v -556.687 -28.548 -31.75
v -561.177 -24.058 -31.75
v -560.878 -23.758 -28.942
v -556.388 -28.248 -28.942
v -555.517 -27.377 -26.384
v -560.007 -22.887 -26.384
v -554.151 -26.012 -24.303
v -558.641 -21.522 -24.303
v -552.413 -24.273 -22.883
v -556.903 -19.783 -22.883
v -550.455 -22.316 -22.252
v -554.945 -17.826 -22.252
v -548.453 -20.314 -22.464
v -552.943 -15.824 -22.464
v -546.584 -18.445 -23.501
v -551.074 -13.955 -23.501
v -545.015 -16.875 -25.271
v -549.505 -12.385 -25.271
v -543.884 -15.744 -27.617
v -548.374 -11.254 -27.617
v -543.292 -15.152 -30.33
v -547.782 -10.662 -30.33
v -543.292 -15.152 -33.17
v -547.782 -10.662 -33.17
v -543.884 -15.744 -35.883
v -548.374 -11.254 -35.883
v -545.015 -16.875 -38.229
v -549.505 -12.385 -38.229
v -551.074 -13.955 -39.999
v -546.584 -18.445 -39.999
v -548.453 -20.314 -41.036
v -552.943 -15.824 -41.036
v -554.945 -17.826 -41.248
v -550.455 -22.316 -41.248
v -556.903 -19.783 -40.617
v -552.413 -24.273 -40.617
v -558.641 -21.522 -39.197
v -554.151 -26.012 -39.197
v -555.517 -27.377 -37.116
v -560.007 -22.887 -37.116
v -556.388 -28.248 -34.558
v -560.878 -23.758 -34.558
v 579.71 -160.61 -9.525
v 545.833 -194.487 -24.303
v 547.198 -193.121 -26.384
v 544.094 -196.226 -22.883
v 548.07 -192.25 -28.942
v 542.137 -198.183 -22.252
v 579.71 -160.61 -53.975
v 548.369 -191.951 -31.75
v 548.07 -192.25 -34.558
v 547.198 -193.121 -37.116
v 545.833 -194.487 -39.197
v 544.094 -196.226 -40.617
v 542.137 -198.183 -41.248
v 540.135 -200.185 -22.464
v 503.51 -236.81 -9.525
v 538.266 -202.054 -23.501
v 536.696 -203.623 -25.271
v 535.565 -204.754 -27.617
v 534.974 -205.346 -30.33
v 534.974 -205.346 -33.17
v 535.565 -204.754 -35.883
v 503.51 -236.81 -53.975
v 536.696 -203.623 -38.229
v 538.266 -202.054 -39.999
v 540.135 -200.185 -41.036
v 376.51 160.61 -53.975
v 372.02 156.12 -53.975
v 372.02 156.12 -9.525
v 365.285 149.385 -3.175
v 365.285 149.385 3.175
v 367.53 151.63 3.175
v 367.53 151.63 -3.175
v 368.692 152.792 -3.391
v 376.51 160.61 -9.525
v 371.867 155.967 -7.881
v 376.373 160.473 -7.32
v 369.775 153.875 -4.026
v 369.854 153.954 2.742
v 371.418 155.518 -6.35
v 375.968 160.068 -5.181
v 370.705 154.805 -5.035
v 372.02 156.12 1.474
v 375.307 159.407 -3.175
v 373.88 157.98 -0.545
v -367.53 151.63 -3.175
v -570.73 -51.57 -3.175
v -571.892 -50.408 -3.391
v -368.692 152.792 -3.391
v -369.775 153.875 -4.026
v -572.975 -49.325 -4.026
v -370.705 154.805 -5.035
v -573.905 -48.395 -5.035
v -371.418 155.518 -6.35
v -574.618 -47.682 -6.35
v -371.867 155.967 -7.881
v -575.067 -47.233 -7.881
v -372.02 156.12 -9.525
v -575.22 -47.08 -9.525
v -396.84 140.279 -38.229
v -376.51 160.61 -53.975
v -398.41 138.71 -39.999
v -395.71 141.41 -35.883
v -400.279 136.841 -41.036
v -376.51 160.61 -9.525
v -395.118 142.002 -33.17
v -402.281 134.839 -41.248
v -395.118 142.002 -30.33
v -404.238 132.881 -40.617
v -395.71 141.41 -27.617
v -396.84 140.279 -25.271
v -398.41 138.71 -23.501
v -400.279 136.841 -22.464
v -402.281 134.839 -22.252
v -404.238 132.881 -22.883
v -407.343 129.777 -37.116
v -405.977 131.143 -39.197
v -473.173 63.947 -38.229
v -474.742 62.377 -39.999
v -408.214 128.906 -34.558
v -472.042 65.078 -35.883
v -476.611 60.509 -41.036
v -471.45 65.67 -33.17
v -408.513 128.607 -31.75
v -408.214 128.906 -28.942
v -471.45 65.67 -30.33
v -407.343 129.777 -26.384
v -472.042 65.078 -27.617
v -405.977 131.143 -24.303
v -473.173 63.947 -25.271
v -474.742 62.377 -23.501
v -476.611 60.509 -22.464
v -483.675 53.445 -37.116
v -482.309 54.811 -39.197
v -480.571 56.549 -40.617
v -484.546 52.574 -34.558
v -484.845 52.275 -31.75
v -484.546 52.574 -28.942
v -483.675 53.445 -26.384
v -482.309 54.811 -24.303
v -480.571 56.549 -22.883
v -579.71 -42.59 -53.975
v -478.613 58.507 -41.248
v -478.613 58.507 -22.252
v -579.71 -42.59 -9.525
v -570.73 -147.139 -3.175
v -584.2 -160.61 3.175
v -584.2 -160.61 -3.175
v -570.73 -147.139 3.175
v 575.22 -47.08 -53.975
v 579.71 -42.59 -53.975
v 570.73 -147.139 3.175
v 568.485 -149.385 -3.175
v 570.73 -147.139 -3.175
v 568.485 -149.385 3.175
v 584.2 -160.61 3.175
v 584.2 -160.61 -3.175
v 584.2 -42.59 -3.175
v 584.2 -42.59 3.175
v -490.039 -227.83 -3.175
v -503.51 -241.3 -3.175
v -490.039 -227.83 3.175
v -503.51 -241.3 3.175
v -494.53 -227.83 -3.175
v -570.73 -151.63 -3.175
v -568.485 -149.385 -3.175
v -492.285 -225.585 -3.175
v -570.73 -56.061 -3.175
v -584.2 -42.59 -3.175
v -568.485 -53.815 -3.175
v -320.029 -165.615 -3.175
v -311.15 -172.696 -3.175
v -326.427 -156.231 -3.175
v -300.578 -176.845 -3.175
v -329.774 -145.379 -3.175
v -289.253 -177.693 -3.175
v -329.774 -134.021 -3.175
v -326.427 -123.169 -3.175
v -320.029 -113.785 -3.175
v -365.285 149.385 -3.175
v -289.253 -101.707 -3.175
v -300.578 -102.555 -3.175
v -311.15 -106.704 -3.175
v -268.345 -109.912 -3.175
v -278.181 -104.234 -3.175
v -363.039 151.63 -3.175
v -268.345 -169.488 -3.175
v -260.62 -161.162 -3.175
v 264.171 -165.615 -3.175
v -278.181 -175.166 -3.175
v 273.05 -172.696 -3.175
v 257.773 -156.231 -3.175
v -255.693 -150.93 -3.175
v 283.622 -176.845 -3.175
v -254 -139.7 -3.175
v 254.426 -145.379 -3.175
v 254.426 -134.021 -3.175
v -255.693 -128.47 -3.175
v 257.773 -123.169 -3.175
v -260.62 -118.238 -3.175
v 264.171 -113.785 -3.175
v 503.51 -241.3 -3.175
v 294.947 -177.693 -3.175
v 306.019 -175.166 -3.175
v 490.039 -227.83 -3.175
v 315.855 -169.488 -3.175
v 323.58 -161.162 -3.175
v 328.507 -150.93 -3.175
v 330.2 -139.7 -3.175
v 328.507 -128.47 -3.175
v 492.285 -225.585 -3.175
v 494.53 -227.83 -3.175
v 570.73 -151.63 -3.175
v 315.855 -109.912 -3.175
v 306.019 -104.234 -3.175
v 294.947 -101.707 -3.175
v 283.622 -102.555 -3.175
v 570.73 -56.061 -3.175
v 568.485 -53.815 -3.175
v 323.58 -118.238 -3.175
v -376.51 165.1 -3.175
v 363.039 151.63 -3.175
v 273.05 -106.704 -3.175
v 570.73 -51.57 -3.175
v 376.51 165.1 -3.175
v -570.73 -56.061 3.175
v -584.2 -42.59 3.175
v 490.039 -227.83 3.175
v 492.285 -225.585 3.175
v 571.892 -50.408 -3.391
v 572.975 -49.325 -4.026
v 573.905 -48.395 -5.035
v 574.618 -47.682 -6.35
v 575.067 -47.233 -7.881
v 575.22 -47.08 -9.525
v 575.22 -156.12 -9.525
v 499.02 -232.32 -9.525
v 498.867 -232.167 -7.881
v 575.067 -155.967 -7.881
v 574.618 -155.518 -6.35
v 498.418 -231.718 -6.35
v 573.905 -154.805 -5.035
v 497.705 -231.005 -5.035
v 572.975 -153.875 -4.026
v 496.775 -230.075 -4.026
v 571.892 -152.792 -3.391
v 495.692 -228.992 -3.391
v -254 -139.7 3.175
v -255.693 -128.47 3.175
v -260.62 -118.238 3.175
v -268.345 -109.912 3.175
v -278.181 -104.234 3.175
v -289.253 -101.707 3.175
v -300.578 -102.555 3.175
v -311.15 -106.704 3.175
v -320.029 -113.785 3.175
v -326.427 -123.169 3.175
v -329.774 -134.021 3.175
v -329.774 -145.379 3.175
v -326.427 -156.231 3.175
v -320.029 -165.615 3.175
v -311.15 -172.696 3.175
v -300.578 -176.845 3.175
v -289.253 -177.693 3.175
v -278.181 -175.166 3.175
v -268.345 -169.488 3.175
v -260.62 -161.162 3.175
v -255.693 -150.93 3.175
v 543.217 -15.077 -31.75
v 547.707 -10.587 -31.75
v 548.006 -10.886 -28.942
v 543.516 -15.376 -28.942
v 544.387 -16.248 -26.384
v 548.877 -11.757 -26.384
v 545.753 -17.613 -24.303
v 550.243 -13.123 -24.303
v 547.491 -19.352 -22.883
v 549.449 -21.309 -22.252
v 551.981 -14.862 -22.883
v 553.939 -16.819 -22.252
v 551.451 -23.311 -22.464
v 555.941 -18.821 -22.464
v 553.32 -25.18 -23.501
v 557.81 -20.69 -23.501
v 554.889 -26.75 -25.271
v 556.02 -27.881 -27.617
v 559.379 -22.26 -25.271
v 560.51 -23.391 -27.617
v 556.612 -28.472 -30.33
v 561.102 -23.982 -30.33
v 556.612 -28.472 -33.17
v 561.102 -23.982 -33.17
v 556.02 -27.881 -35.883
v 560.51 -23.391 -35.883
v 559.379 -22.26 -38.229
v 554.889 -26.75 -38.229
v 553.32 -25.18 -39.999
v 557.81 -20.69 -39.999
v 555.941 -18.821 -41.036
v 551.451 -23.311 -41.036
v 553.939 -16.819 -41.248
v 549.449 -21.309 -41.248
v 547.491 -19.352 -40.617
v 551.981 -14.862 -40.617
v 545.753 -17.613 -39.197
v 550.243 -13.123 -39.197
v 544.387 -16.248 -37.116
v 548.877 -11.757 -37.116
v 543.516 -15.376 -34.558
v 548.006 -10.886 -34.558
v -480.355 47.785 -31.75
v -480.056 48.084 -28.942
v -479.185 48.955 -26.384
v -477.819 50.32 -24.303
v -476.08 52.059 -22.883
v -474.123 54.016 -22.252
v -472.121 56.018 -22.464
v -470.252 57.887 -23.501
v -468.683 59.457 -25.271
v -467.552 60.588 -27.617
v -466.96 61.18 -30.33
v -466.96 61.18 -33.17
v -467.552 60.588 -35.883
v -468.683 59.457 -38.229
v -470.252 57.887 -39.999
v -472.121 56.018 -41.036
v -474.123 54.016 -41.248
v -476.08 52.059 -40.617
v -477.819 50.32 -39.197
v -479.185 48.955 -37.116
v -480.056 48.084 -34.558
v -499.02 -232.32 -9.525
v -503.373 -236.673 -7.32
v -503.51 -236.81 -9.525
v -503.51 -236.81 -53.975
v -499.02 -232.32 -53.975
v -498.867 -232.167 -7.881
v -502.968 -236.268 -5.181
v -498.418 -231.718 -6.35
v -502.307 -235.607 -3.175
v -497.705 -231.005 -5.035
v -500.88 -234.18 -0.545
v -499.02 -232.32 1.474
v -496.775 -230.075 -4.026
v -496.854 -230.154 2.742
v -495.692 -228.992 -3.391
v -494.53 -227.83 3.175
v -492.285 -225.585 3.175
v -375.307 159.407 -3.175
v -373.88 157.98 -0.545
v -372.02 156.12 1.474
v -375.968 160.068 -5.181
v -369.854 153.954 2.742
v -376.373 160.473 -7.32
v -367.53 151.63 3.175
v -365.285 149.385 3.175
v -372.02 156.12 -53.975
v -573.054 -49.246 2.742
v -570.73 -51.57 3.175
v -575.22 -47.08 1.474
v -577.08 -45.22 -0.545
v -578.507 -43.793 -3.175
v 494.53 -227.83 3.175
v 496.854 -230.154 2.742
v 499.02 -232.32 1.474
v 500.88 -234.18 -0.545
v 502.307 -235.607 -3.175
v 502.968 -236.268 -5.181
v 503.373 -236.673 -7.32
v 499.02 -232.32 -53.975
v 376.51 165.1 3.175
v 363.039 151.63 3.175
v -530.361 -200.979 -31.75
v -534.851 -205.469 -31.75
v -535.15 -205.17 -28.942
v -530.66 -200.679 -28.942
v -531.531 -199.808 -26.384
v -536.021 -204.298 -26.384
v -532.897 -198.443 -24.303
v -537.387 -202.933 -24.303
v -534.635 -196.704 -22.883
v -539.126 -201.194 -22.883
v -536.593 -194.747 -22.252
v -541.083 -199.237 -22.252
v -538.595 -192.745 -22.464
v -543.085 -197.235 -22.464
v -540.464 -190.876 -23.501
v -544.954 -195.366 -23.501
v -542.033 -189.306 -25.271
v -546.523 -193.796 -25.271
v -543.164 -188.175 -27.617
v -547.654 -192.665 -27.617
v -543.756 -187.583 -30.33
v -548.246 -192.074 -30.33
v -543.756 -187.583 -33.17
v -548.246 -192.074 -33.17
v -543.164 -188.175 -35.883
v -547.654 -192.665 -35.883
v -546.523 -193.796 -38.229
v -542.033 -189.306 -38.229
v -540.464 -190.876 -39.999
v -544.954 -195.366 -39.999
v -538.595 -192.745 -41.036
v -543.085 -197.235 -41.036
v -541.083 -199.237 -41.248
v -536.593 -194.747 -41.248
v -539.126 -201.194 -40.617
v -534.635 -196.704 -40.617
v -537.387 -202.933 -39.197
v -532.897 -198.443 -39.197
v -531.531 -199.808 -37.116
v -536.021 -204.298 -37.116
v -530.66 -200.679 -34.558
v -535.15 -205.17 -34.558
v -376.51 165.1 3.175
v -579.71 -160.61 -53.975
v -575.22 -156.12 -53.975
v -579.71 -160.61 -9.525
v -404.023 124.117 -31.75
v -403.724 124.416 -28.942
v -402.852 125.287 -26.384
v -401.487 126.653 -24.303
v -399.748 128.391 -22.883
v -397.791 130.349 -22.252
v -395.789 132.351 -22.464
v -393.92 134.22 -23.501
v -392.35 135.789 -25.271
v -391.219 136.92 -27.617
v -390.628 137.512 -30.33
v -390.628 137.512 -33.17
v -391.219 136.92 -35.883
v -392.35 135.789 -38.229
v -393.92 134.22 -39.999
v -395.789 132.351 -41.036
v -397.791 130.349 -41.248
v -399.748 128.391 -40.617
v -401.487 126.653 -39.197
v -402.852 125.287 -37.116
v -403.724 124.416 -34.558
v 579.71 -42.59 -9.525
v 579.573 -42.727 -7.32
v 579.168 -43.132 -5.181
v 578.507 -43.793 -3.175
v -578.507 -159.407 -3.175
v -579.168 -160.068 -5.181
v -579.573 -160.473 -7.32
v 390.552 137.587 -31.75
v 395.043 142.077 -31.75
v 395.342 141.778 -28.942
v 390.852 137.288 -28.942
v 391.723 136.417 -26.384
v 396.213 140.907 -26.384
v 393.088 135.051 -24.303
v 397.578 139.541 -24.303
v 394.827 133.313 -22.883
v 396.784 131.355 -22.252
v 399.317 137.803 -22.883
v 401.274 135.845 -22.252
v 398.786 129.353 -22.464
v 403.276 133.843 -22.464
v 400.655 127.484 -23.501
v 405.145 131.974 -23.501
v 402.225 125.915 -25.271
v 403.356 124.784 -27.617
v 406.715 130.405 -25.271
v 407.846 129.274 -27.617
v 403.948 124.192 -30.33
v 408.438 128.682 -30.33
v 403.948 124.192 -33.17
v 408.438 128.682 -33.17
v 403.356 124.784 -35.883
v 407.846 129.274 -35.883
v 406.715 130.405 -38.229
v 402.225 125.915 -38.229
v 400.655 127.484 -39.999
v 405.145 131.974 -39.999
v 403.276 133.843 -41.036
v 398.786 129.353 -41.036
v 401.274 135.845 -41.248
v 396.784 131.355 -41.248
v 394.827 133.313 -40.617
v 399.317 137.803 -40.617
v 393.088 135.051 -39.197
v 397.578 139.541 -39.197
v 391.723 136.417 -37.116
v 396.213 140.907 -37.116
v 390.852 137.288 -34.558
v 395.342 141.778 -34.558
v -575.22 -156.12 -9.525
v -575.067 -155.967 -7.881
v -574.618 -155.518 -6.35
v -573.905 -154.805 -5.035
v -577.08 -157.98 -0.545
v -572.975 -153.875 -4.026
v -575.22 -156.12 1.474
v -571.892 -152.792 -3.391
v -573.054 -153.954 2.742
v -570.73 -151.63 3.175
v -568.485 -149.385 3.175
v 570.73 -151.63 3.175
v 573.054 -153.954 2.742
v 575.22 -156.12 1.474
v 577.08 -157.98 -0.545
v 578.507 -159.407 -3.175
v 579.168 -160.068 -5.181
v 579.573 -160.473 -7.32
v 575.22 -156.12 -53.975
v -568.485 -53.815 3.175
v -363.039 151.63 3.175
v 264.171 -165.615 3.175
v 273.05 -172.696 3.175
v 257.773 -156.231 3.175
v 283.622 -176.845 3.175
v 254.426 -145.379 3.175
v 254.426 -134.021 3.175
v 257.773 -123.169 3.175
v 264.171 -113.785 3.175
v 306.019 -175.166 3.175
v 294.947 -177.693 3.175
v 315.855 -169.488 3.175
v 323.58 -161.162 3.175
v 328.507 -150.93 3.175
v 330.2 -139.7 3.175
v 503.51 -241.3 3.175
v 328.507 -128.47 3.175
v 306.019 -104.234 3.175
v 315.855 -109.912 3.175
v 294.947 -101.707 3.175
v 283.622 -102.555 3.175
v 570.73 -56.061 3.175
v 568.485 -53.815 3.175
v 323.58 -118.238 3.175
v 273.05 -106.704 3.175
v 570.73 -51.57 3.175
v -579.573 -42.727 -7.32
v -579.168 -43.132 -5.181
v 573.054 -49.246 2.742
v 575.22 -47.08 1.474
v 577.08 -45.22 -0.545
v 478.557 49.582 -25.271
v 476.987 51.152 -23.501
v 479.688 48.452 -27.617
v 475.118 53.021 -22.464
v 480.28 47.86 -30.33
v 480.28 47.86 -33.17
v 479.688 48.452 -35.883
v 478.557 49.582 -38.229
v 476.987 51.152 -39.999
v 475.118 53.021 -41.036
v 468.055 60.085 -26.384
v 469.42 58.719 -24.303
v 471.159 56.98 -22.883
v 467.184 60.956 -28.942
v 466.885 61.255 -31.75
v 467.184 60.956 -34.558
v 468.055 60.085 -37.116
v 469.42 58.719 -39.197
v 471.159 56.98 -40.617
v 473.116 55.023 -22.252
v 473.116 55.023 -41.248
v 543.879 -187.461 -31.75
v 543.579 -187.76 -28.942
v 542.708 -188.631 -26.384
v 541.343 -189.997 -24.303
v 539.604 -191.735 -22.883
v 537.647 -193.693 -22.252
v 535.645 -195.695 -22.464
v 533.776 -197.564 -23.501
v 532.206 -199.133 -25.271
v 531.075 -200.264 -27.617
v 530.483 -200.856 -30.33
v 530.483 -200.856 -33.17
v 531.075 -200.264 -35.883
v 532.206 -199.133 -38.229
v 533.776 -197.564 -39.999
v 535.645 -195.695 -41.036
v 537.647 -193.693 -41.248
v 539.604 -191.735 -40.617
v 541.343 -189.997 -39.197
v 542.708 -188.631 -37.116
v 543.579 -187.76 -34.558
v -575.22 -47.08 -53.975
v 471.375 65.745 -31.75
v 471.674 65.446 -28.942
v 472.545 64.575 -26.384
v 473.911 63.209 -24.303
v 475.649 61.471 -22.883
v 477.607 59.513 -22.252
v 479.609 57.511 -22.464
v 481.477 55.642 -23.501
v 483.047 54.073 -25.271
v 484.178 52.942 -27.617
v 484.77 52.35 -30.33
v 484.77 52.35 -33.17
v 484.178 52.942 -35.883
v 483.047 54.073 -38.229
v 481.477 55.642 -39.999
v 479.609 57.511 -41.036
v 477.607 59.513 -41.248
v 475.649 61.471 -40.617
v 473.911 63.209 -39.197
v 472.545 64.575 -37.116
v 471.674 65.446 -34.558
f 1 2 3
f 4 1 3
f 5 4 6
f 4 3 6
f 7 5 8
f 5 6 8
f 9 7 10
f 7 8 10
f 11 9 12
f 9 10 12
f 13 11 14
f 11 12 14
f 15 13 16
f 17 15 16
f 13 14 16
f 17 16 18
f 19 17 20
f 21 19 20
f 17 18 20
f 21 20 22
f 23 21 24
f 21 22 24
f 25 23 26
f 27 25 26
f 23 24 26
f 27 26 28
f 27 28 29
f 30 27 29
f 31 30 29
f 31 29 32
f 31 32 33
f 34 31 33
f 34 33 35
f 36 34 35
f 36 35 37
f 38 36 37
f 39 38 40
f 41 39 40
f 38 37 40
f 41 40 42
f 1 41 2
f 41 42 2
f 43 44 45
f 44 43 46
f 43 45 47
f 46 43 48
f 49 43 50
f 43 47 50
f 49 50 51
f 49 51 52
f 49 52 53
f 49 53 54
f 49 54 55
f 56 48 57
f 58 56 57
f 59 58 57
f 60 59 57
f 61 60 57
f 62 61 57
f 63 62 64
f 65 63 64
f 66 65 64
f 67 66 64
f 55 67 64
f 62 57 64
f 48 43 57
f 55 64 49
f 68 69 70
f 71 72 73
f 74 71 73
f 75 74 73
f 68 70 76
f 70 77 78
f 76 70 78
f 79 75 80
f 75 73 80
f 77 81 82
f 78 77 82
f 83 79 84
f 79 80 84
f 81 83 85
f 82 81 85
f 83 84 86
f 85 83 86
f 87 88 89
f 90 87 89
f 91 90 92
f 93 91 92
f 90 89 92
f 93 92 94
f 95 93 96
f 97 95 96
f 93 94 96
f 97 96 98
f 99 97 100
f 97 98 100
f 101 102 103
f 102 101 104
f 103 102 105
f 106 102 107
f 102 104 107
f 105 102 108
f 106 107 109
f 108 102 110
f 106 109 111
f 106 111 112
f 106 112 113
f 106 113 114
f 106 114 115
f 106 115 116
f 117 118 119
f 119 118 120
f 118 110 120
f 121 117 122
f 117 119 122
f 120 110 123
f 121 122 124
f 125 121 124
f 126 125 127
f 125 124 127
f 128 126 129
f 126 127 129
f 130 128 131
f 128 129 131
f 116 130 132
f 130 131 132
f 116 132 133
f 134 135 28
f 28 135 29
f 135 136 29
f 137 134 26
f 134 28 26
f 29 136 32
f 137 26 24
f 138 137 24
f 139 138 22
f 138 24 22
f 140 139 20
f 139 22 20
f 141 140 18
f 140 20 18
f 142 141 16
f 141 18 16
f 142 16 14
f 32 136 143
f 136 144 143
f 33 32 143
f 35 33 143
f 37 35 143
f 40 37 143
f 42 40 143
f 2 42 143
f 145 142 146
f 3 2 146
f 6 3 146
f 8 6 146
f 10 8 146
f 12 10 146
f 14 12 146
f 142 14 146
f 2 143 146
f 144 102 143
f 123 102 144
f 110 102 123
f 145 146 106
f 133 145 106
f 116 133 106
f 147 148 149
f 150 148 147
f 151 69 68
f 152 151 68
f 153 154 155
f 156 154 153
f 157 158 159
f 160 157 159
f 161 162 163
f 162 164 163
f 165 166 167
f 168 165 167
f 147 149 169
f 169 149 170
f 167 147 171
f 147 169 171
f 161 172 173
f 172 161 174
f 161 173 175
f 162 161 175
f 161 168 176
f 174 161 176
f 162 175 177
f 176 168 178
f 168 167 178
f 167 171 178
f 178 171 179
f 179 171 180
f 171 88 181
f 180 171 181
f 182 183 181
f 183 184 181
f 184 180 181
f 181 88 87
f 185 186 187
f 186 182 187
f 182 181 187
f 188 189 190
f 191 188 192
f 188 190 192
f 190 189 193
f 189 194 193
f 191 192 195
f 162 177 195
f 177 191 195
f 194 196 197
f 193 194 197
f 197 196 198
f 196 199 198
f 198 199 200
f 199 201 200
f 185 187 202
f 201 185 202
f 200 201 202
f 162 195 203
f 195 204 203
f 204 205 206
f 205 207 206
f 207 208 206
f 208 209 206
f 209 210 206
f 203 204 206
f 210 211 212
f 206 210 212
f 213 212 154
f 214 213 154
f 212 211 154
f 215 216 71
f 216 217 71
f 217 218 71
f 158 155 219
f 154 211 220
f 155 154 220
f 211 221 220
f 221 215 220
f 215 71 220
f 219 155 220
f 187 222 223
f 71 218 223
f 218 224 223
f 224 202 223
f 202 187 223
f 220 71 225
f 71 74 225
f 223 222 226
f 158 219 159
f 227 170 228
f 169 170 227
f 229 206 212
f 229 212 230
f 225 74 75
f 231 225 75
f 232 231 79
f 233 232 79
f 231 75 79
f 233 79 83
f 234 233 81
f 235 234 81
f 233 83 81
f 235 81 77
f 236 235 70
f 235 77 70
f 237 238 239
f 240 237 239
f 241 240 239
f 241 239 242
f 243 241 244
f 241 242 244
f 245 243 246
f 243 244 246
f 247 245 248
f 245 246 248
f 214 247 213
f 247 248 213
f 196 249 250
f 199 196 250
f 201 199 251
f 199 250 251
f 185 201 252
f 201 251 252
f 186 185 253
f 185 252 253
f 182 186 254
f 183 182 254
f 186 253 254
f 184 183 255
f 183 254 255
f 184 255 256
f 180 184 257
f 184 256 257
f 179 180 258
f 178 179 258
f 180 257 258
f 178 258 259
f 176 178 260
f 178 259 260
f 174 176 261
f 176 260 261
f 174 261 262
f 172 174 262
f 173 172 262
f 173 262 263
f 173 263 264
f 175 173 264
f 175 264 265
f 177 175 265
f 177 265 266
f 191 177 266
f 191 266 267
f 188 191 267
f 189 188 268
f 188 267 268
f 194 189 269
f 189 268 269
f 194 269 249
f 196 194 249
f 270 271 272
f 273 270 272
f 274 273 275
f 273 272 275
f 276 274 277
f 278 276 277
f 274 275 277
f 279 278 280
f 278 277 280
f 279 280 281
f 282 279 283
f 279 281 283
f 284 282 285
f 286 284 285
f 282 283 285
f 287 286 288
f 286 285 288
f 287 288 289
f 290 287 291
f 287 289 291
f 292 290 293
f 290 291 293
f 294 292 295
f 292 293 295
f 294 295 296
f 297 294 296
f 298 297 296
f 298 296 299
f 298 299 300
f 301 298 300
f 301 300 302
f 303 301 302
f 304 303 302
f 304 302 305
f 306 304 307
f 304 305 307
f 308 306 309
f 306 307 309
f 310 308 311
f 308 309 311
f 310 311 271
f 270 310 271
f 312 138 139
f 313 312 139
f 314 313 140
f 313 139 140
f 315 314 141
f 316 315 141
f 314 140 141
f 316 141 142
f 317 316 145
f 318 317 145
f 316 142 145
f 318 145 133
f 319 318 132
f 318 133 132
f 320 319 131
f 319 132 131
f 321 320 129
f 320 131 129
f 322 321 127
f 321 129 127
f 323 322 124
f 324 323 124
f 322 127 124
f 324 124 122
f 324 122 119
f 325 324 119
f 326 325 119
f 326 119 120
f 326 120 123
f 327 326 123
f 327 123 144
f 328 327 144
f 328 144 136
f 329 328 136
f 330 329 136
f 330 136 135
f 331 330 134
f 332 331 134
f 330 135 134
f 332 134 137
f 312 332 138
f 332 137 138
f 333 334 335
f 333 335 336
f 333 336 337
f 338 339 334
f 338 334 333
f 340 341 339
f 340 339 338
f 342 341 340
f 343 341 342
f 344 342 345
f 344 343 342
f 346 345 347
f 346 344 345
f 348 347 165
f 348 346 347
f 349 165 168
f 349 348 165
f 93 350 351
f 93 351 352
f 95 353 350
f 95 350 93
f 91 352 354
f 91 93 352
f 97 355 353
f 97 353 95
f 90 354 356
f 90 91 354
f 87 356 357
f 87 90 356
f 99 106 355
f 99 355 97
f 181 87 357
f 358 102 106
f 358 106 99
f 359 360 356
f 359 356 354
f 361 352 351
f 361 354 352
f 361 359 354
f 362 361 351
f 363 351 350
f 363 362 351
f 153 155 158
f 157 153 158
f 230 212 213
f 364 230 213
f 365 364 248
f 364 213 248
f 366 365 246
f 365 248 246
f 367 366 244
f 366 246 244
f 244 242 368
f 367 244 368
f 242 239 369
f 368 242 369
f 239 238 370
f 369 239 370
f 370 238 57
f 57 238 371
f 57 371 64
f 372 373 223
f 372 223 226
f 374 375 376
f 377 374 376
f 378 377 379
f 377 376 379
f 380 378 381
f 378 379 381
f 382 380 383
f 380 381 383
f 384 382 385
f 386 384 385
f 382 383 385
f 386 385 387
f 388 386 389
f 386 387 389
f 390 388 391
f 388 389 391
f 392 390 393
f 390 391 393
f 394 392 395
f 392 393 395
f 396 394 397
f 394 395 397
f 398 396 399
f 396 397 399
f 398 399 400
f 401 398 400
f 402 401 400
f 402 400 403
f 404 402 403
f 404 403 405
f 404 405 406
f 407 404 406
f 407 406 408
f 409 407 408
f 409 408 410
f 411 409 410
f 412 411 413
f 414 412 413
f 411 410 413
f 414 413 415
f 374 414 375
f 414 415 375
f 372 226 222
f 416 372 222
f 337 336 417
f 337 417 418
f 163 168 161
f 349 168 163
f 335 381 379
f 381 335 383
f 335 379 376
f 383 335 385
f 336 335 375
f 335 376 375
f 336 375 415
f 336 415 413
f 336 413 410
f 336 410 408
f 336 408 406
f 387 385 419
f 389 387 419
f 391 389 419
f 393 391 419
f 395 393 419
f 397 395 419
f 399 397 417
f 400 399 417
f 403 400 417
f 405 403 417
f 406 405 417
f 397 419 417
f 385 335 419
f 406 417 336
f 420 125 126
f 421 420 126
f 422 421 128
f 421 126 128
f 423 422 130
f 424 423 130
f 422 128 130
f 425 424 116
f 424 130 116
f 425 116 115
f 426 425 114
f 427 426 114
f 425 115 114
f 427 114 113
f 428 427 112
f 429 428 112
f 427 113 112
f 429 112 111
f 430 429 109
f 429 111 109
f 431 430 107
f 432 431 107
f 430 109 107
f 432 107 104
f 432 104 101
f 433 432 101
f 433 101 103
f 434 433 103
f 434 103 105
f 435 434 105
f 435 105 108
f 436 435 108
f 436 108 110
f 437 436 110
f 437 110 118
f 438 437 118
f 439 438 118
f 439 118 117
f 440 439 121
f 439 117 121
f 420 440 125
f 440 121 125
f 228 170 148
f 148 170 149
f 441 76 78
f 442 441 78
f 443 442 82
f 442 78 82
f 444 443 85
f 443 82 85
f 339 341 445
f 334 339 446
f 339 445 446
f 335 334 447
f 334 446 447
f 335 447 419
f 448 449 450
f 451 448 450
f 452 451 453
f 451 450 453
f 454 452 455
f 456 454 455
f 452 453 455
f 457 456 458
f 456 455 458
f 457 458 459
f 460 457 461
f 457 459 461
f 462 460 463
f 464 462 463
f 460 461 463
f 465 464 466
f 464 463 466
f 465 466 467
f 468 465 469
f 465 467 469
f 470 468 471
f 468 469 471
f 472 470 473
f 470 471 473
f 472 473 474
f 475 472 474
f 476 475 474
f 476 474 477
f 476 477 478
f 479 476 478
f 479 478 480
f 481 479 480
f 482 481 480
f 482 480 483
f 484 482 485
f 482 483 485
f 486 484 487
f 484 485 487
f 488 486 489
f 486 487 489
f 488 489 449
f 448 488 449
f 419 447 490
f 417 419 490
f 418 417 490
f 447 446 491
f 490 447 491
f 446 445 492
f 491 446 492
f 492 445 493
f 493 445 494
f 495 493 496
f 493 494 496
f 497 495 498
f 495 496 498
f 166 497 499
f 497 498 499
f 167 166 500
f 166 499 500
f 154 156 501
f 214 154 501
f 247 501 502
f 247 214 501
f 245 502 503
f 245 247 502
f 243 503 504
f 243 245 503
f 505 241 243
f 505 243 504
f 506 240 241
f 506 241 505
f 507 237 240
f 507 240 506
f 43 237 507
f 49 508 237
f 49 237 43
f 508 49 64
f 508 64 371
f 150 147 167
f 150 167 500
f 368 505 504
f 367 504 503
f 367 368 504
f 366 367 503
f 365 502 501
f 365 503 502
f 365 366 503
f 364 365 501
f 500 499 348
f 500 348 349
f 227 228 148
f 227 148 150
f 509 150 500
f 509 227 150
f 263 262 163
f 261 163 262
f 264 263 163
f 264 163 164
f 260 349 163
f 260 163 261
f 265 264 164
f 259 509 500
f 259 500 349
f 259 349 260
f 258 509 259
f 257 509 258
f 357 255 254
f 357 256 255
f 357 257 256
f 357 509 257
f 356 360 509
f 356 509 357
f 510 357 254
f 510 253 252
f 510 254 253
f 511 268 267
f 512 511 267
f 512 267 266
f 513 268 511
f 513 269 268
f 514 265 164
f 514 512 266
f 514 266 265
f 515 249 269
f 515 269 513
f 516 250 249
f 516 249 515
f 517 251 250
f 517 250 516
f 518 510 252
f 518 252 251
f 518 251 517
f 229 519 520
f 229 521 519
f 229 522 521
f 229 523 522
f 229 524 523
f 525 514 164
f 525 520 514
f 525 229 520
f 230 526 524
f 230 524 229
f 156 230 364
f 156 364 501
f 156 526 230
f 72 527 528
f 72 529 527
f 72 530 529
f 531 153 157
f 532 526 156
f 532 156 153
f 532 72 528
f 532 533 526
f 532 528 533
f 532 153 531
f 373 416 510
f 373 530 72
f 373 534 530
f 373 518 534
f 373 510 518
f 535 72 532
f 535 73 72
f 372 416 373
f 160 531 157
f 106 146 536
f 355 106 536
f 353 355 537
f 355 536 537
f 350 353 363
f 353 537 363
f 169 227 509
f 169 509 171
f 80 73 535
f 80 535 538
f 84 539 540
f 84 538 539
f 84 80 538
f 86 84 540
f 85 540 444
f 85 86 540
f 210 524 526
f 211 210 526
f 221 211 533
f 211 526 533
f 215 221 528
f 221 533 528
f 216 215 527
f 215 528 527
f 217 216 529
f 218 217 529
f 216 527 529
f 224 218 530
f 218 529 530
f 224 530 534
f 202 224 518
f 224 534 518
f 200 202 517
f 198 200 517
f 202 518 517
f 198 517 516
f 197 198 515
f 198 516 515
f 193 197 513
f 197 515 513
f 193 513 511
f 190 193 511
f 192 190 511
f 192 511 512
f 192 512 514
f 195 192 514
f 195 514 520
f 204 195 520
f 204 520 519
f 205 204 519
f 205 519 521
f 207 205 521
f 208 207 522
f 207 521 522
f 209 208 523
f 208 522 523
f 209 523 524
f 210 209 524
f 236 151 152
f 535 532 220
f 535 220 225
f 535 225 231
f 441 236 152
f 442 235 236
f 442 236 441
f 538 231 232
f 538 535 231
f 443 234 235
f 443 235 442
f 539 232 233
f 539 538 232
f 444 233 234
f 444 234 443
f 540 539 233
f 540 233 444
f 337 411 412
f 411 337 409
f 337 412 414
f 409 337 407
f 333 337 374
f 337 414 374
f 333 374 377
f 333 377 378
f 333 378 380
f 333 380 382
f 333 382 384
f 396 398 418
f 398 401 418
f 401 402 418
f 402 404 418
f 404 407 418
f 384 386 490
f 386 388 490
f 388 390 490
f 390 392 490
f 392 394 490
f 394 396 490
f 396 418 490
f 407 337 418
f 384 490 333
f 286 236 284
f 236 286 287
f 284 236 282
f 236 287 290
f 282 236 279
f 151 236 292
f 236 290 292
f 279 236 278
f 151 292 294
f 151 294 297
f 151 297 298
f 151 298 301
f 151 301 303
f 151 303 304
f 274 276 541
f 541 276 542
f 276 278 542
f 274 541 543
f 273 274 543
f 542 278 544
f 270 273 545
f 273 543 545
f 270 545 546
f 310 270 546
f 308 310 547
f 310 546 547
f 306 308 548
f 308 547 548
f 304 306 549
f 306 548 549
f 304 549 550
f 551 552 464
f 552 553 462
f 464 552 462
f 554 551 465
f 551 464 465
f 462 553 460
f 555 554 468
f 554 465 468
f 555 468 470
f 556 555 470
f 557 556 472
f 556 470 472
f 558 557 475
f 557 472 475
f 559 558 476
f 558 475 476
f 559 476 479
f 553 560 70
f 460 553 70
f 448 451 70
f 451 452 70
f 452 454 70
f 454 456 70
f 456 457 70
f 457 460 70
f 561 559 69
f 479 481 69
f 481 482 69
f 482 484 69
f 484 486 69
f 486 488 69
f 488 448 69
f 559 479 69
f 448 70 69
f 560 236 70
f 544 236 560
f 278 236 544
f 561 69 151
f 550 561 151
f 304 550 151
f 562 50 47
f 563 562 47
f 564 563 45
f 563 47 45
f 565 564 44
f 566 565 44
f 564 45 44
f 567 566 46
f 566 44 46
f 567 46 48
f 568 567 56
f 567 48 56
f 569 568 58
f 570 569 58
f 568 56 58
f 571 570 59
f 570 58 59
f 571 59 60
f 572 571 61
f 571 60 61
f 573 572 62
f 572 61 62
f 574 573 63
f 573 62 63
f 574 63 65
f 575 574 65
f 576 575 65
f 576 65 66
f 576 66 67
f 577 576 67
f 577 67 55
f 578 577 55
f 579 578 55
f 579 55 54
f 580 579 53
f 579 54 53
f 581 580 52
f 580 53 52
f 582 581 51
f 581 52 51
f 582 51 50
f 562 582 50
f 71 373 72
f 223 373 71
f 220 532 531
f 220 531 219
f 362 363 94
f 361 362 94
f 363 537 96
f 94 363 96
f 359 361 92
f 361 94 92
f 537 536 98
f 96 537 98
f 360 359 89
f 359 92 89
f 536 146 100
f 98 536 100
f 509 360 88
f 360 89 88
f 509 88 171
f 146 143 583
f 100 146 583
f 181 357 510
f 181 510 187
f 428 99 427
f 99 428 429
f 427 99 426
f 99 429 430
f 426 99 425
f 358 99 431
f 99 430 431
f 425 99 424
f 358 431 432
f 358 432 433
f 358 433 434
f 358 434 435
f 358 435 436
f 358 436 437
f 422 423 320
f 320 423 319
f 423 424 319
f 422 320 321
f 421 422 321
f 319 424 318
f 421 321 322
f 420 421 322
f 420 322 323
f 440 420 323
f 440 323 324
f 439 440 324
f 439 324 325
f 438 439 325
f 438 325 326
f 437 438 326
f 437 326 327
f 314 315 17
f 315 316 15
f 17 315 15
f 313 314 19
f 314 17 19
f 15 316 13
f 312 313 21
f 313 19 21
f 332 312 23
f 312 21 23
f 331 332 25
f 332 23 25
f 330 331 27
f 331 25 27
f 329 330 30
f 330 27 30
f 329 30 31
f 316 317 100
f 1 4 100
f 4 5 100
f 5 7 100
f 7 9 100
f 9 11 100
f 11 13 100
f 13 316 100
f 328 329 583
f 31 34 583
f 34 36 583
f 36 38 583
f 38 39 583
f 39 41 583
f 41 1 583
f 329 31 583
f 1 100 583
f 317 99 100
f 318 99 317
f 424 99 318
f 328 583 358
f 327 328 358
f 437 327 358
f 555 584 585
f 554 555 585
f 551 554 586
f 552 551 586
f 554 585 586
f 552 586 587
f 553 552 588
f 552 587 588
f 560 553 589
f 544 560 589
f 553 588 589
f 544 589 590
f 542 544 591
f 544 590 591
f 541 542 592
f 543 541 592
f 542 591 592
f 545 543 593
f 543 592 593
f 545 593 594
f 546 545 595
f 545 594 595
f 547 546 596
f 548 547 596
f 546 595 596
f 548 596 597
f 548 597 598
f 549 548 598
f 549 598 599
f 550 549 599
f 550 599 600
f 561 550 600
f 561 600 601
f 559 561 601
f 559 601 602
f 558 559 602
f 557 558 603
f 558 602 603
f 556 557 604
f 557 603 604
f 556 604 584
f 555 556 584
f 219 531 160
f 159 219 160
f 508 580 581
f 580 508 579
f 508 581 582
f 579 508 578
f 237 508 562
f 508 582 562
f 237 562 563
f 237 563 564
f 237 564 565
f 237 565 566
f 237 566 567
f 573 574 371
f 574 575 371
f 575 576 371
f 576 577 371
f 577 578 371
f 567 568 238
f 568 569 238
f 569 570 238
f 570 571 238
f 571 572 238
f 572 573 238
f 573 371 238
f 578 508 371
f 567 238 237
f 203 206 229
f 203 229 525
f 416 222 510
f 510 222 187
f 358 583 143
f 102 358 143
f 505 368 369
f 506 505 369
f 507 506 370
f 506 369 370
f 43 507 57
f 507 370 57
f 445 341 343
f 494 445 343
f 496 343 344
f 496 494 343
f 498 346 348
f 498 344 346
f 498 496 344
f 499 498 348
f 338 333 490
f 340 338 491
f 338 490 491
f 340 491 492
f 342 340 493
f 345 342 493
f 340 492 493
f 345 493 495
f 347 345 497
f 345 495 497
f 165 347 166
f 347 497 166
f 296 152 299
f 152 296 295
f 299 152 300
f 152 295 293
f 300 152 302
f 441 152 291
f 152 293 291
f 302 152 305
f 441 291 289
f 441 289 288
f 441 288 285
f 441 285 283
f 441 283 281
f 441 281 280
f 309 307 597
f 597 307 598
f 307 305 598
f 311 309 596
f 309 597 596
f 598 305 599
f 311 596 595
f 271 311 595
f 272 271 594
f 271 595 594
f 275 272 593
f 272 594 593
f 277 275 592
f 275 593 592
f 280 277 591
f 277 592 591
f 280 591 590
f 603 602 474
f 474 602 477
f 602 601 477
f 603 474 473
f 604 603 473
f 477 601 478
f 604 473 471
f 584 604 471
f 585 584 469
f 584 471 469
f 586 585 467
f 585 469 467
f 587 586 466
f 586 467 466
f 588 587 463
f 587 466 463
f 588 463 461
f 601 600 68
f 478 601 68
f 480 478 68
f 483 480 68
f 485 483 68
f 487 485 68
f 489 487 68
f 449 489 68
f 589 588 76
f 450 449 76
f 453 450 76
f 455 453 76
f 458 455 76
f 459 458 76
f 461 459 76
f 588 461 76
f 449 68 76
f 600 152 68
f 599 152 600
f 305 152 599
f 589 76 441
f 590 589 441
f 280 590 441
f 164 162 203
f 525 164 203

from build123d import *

# Parameters (mm, degrees)
BASE_FLANGE1_START    = -3.175
BASE_FLANGE1_DEPTH    = 6.35
EDGE_FLANGE1_START    = 152.664354058
EDGE_FLANGE1_DEPTH    = 287.368195874
EDGE_FLANGE1_START_2  = -296.348451995
EDGE_FLANGE1_2_DEPTH  = 107.763073453
EDGE_FLANGE1_START_3  = -826.183563138
EDGE_FLANGE1_3_DEPTH  = 287.368195874
EDGE_FLANGE1_START_4  = -197.565634664
EDGE_FLANGE1_4_DEPTH  = 107.763073453
EDGE_FLANGE1_START_5  = 149.489354058
EDGE_FLANGE1_5_DEPTH  = 293.718195874
EDGE_FLANGE1_START_6  = -299.523451995
EDGE_FLANGE1_6_DEPTH  = 114.113073453
EDGE_FLANGE1_7_DEPTH  = 3.175
EDGE_FLANGE1_START_7  = -188.585378542
EDGE_FLANGE1_8_DEPTH  = 3.175
EDGE_FLANGE1_9_DEPTH  = 3.175
EDGE_FLANGE1_START_8  = 440.032549932
EDGE_FLANGE1_10_DEPTH = 3.175
EDGE_FLANGE1_START_9  = -829.358563138
EDGE_FLANGE1_11_DEPTH = 293.718195874
EDGE_FLANGE1_START_10 = -200.740634664
EDGE_FLANGE1_12_DEPTH = 114.113073453
EDGE_FLANGE1_13_DEPTH = 3.175
EDGE_FLANGE1_START_11 = -538.815367264
EDGE_FLANGE1_14_DEPTH = 3.175
EDGE_FLANGE1_15_DEPTH = 3.175
EDGE_FLANGE1_START_12 = -89.802561211
EDGE_FLANGE1_16_DEPTH = 3.175
SKETCH21_R            = 9.525
CUT_EXTRUDE1_DEPTH    = 6.35
SKETCH22_R            = 9.525
CUT_EXTRUDE2_DEPTH    = 6.35
SKETCH29_R            = 9.525
CUT_EXTRUDE5_DEPTH    = 6.35
SKETCH30_R            = 9.525
CUT_EXTRUDE6_DEPTH    = 6.35
SKETCH31_R            = 38.1
CUT_EXTRUDE7_DEPTH    = 6.35


# Read off the part's stored shape, not the designer's step: Base-Flange1, Edge-Flange1
with BuildPart() as part:
    # Base-Flange1 outline → Base-Flange1 (new body)
    with BuildSketch(Plane.XY.offset(BASE_FLANGE1_START)):
        Polygon((-508, -241.3), (508, -241.3), (584.2, -165.1), (584.2, -38.1), (381, 165.1), (-381, 165.1), (-584.2, -38.1), (-584.2, -165.1), align=None)
    extrude(amount=BASE_FLANGE1_DEPTH)

    # Edge-Flange1 outline → Edge-Flange1 (add)
    with BuildSketch(Plane(origin=(0, 0, 0), x_dir=(0.7071067811865474, 0.7071067811865477, 0), z_dir=(0.7071067811865476, -0.7071067811865476, 0)).offset(EDGE_FLANGE1_START)):
        with BuildLine():
            Line((378.099535834, -3.175), (367.101013206, -3.175))
            ThreePointArc((367.101013206, -3.175), (371.591141267, -5.034871939), (373.451013206, -9.525))
            Line((373.451013206, -9.525), (373.451013206, -53.975))
            Line((373.451013206, -53.975), (379.801013206, -53.975))
            Line((379.801013206, -53.975), (379.801013206, -9.525))
            ThreePointArc((379.801013206, -9.525), (379.3682712, -6.237998127), (378.099535834, -3.175))
        make_face()
    extrude(amount=EDGE_FLANGE1_DEPTH)

    # Edge-Flange1 2 outline → Edge-Flange1 2 (add)
    with BuildSketch(Plane(origin=(0, 0, 0), x_dir=(0.7071067811865474, 0.7071067811865477, 0), z_dir=(0.7071067811865476, -0.7071067811865476, 0)).offset(EDGE_FLANGE1_START_2)):
        with BuildLine():
            ThreePointArc((-517.135111143, -9.525), (-515.275239204, -5.034871939), (-510.785111143, -3.175))
            Line((-510.785111143, -3.175), (-521.783633771, -3.175))
            ThreePointArc((-521.783633771, -3.175), (-523.052369137, -6.237998127), (-523.485111143, -9.525))
            Line((-523.485111143, -9.525), (-523.485111143, -53.975))
            Line((-523.485111143, -53.975), (-517.135111143, -53.975))
            Line((-517.135111143, -53.975), (-517.135111143, -9.525))
        make_face()
    extrude(amount=EDGE_FLANGE1_2_DEPTH)

    # Edge-Flange1 3 outline → Edge-Flange1 3 (add)
    with BuildSketch(Plane(origin=(273.05, 273.05, -3.175), x_dir=(0.7071067811865481, -0.7071067811865469, 0), z_dir=(0.7071067811865469, 0.7071067811865481, 3.4914813388431334e-15)).offset(EDGE_FLANGE1_START_3)):
        with BuildLine():
            Line((-378.099535834, 0), (-367.101013206, 0))
            ThreePointArc((-367.101013206, 0), (-371.591141267, 1.859871939), (-373.451013206, 6.35))
            Line((-373.451013206, 6.35), (-373.451013206, 50.8))
            Line((-373.451013206, 50.8), (-379.801013206, 50.8))
            Line((-379.801013206, 50.8), (-379.801013206, 6.35))
            ThreePointArc((-379.801013206, 6.35), (-379.3682712, 3.062998127), (-378.099535834, 0))
        make_face()
    extrude(amount=EDGE_FLANGE1_3_DEPTH)

    # Edge-Flange1 4 outline → Edge-Flange1 4 (add)
    with BuildSketch(Plane(origin=(273.05, 273.05, -3.175), x_dir=(0.7071067811865481, -0.7071067811865469, 0), z_dir=(0.7071067811865469, 0.7071067811865481, 3.4914813388431334e-15)).offset(EDGE_FLANGE1_START_4)):
        with BuildLine():
            ThreePointArc((517.135111143, 6.35), (515.275239204, 1.859871939), (510.785111143, 0))
            Line((510.785111143, 0), (521.783633771, 0))
            ThreePointArc((521.783633771, 0), (523.052369137, 3.062998127), (523.485111143, 6.35))
            Line((523.485111143, 6.35), (523.485111143, 50.8))
            Line((523.485111143, 50.8), (517.135111143, 50.8))
            Line((517.135111143, 50.8), (517.135111143, 6.35))
        make_face()
    extrude(amount=EDGE_FLANGE1_4_DEPTH)

    # Edge-Flange1 5 outline → Edge-Flange1 5 (cut)
    with BuildSketch(Plane(origin=(0, 0, 0), x_dir=(0.7071067811865474, 0.7071067811865477, 0), z_dir=(0.7071067811865476, -0.7071067811865476, 0)).offset(EDGE_FLANGE1_START_5)):
        with BuildLine():
            Line((386.151013206, 3.175), (367.101013206, 3.175))
            ThreePointArc((367.101013206, 3.175), (373.451013206, 1.473522628), (378.099535834, -3.175))
            Line((378.099535834, -3.175), (386.151013206, -3.175))
            Line((386.151013206, -3.175), (386.151013206, 3.175))
        make_face()
    extrude(amount=EDGE_FLANGE1_5_DEPTH, mode=Mode.SUBTRACT)

    # Edge-Flange1 6 outline → Edge-Flange1 6 (cut)
    with BuildSketch(Plane(origin=(0, 0, 0), x_dir=(0.7071067811865474, 0.7071067811865477, 0), z_dir=(0.7071067811865476, -0.7071067811865476, 0)).offset(EDGE_FLANGE1_START_6)):
        with BuildLine():
            ThreePointArc((-521.783633771, -3.175), (-517.135111143, 1.473522628), (-510.785111143, 3.175))
            Line((-510.785111143, 3.175), (-529.835111143, 3.175))
            Line((-529.835111143, 3.175), (-529.835111143, -3.175))
            Line((-529.835111143, -3.175), (-521.783633771, -3.175))
        make_face()
    extrude(amount=EDGE_FLANGE1_6_DEPTH, mode=Mode.SUBTRACT)

    # Edge-Flange1 7 outline → Edge-Flange1 7 (cut)
    with BuildSketch(Plane(origin=(0, 0, 0), x_dir=(0.7071067811865474, 0.7071067811865477, 0), z_dir=(0.7071067811865476, -0.7071067811865476, 0)).offset(EDGE_FLANGE1_START_6)):
        with BuildLine():
            Line((-521.783633771, -3.175), (-507.610111143, -3.175))
            Line((-507.610111143, -3.175), (-507.610111143, 3.175))
            Line((-507.610111143, 3.175), (-510.785111143, 3.175))
            ThreePointArc((-510.785111143, 3.175), (-517.135111143, 1.473522628), (-521.783633771, -3.175))
        make_face()
    extrude(amount=EDGE_FLANGE1_7_DEPTH, mode=Mode.SUBTRACT)

    # Edge-Flange1 8 outline → Edge-Flange1 8 (cut)
    with BuildSketch(Plane(origin=(0, 0, 0), x_dir=(0.7071067811865474, 0.7071067811865477, 0), z_dir=(0.7071067811865476, -0.7071067811865476, 0)).offset(EDGE_FLANGE1_START_7)):
        with BuildLine():
            Line((-521.783633771, -3.175), (-507.610111143, -3.175))
            Line((-507.610111143, -3.175), (-507.610111143, 3.175))
            Line((-507.610111143, 3.175), (-510.785111143, 3.175))
            ThreePointArc((-510.785111143, 3.175), (-517.135111143, 1.473522628), (-521.783633771, -3.175))
        make_face()
    extrude(amount=EDGE_FLANGE1_8_DEPTH, mode=Mode.SUBTRACT)

    # Edge-Flange1 9 outline → Edge-Flange1 9 (cut)
    with BuildSketch(Plane(origin=(0, 0, 0), x_dir=(0.7071067811865474, 0.7071067811865477, 0), z_dir=(0.7071067811865476, -0.7071067811865476, 0)).offset(EDGE_FLANGE1_START_5)):
        with BuildLine():
            Line((363.926013206, 3.175), (363.926013206, -3.175))
            Line((363.926013206, -3.175), (378.099535834, -3.175))
            ThreePointArc((378.099535834, -3.175), (373.451013206, 1.473522628), (367.101013206, 3.175))
            Line((367.101013206, 3.175), (363.926013206, 3.175))
        make_face()
    extrude(amount=EDGE_FLANGE1_9_DEPTH, mode=Mode.SUBTRACT)

    # Edge-Flange1 10 outline → Edge-Flange1 10 (cut)
    with BuildSketch(Plane(origin=(0, 0, 0), x_dir=(0.7071067811865474, 0.7071067811865477, 0), z_dir=(0.7071067811865476, -0.7071067811865476, 0)).offset(EDGE_FLANGE1_START_8)):
        with BuildLine():
            Line((363.926013206, 3.175), (363.926013206, -3.175))
            Line((363.926013206, -3.175), (378.099535834, -3.175))
            ThreePointArc((378.099535834, -3.175), (373.451013206, 1.473522628), (367.101013206, 3.175))
            Line((367.101013206, 3.175), (363.926013206, 3.175))
        make_face()
    extrude(amount=EDGE_FLANGE1_10_DEPTH, mode=Mode.SUBTRACT)

    # Edge-Flange1 11 outline → Edge-Flange1 11 (cut)
    with BuildSketch(Plane(origin=(273.05, 273.05, -3.175), x_dir=(0.7071067811865481, -0.7071067811865469, 0), z_dir=(0.7071067811865469, 0.7071067811865481, 3.4914813388431334e-15)).offset(EDGE_FLANGE1_START_9)):
        with BuildLine():
            Line((-386.151013206, -6.35), (-367.101013206, -6.35))
            ThreePointArc((-367.101013206, -6.35), (-373.451013206, -4.648522628), (-378.099535834, 0))
            Line((-378.099535834, 0), (-386.151013206, 0))
            Line((-386.151013206, 0), (-386.151013206, -6.35))
        make_face()
    extrude(amount=EDGE_FLANGE1_11_DEPTH, mode=Mode.SUBTRACT)

    # Edge-Flange1 12 outline → Edge-Flange1 12 (cut)
    with BuildSketch(Plane(origin=(273.05, 273.05, -3.175), x_dir=(0.7071067811865481, -0.7071067811865469, 0), z_dir=(0.7071067811865469, 0.7071067811865481, 3.4914813388431334e-15)).offset(EDGE_FLANGE1_START_10)):
        with BuildLine():
            ThreePointArc((521.783633771, 0), (517.135111143, -4.648522628), (510.785111143, -6.35))
            Line((510.785111143, -6.35), (529.835111143, -6.35))
            Line((529.835111143, -6.35), (529.835111143, 0))
            Line((529.835111143, 0), (521.783633771, 0))
        make_face()
    extrude(amount=EDGE_FLANGE1_12_DEPTH, mode=Mode.SUBTRACT)

    # Edge-Flange1 13 outline → Edge-Flange1 13 (cut)
    with BuildSketch(Plane(origin=(273.05, 273.05, -3.175), x_dir=(0.7071067811865481, -0.7071067811865469, 0), z_dir=(0.7071067811865469, 0.7071067811865481, 3.4914813388431334e-15)).offset(EDGE_FLANGE1_START_9)):
        with BuildLine():
            Line((-363.926013206, -6.35), (-363.926013206, 0))
            Line((-363.926013206, 0), (-378.099535834, 0))
            ThreePointArc((-378.099535834, 0), (-373.451013206, -4.648522628), (-367.101013206, -6.35))
            Line((-367.101013206, -6.35), (-363.926013206, -6.35))
        make_face()
    extrude(amount=EDGE_FLANGE1_13_DEPTH, mode=Mode.SUBTRACT)

    # Edge-Flange1 14 outline → Edge-Flange1 14 (cut)
    with BuildSketch(Plane(origin=(273.05, 273.05, -3.175), x_dir=(0.7071067811865481, -0.7071067811865469, 0), z_dir=(0.7071067811865469, 0.7071067811865481, 3.4914813388431334e-15)).offset(EDGE_FLANGE1_START_11)):
        with BuildLine():
            Line((-363.926013206, -6.35), (-363.926013206, 0))
            Line((-363.926013206, 0), (-378.099535834, 0))
            ThreePointArc((-378.099535834, 0), (-373.451013206, -4.648522628), (-367.101013206, -6.35))
            Line((-367.101013206, -6.35), (-363.926013206, -6.35))
        make_face()
    extrude(amount=EDGE_FLANGE1_14_DEPTH, mode=Mode.SUBTRACT)

    # Edge-Flange1 15 outline → Edge-Flange1 15 (cut)
    with BuildSketch(Plane(origin=(273.05, 273.05, -3.175), x_dir=(0.7071067811865481, -0.7071067811865469, 0), z_dir=(0.7071067811865469, 0.7071067811865481, 3.4914813388431334e-15)).offset(EDGE_FLANGE1_START_10)):
        with BuildLine():
            Line((521.783633771, 0), (507.610111143, 0))
            Line((507.610111143, 0), (507.610111143, -6.35))
            Line((507.610111143, -6.35), (510.785111143, -6.35))
            ThreePointArc((510.785111143, -6.35), (517.135111143, -4.648522628), (521.783633771, 0))
        make_face()
    extrude(amount=EDGE_FLANGE1_15_DEPTH, mode=Mode.SUBTRACT)

    # Edge-Flange1 16 outline → Edge-Flange1 16 (cut)
    with BuildSketch(Plane(origin=(273.05, 273.05, -3.175), x_dir=(0.7071067811865481, -0.7071067811865469, 0), z_dir=(0.7071067811865469, 0.7071067811865481, 3.4914813388431334e-15)).offset(EDGE_FLANGE1_START_12)):
        with BuildLine():
            Line((521.783633771, 0), (507.610111143, 0))
            Line((507.610111143, 0), (507.610111143, -6.35))
            Line((507.610111143, -6.35), (510.785111143, -6.35))
            ThreePointArc((510.785111143, -6.35), (517.135111143, -4.648522628), (521.783633771, 0))
        make_face()
    extrude(amount=EDGE_FLANGE1_16_DEPTH, mode=Mode.SUBTRACT)

    # Sketch21 → Cut-Extrude1 (cut)
    with BuildSketch(Plane(origin=(268.559871939, 268.559871939, 0), x_dir=(0, 0, -1), z_dir=(0.7071067811865468, 0.7071067811865483, 1.5453665931926906e-15))):
        with Locations(Location((31.75, -188.398458358, 0), (0, 0, 90))):
            Circle(SKETCH21_R)
        with Locations(Location((31.75, -296.348458358, 0), (0, 0, 90))):
            Circle(SKETCH21_R)
        with Locations(Location((31.75, -404.298458358, 0), (0, 0, 90))):
            Circle(SKETCH21_R)
    extrude(amount=-CUT_EXTRUDE1_DEPTH, mode=Mode.SUBTRACT)

    # Sketch22 → Cut-Extrude2 (cut)
    with BuildSketch(Plane(origin=(-268.559871939, 268.559871939, 0), x_dir=(0, 0, 1), z_dir=(-0.707106781186548, 0.7071067811865471, 4.2497581312798994e-15))):
        with Locations(Location((-31.75, -188.398458358, 0), (0, 0, 270))):
            Circle(SKETCH22_R)
        with Locations(Location((-31.75, -296.348458358, 0), (0, 0, 270))):
            Circle(SKETCH22_R)
        with Locations(Location((-31.75, -404.298458358, 0), (0, 0, 270))):
            Circle(SKETCH22_R)
    extrude(amount=-CUT_EXTRUDE2_DEPTH, mode=Mode.SUBTRACT)

    # Sketch29 → Cut-Extrude5 (cut)
    with BuildSketch(Plane(origin=(370.159871939, -370.159871939, 0), x_dir=(0, 0, -1), z_dir=(0.7071067811865457, -0.7071067811865493, 4.2497581312799065e-15))):
        with Locations(Location((31.75, 242.500451995, 0), (0, 0, 90))):
            Circle(SKETCH29_R)
    extrude(amount=-CUT_EXTRUDE5_DEPTH, mode=Mode.SUBTRACT)

    # Sketch30 → Cut-Extrude6 (cut)
    with BuildSketch(Plane(origin=(-370.159871939, -370.159871939, 0), x_dir=(0, 0, 1), z_dir=(-0.7071067811865476, -0.7071067811865476, 3.0907331863853848e-15))):
        with Locations(Location((-31.75, 242.433378542, 0), (0, 0, 270))):
            Circle(SKETCH30_R)
    extrude(amount=-CUT_EXTRUDE6_DEPTH, mode=Mode.SUBTRACT)

    # Sketch31 → Cut-Extrude7 (cut)
    with BuildSketch(Plane.XY.offset(3.175)):
        with Locations((-292.1, -139.7)):
            Circle(SKETCH31_R)
        with Locations((292.1, -139.7)):
            Circle(SKETCH31_R)
    extrude(amount=-CUT_EXTRUDE7_DEPTH, mode=Mode.SUBTRACT)


solid = part.part
